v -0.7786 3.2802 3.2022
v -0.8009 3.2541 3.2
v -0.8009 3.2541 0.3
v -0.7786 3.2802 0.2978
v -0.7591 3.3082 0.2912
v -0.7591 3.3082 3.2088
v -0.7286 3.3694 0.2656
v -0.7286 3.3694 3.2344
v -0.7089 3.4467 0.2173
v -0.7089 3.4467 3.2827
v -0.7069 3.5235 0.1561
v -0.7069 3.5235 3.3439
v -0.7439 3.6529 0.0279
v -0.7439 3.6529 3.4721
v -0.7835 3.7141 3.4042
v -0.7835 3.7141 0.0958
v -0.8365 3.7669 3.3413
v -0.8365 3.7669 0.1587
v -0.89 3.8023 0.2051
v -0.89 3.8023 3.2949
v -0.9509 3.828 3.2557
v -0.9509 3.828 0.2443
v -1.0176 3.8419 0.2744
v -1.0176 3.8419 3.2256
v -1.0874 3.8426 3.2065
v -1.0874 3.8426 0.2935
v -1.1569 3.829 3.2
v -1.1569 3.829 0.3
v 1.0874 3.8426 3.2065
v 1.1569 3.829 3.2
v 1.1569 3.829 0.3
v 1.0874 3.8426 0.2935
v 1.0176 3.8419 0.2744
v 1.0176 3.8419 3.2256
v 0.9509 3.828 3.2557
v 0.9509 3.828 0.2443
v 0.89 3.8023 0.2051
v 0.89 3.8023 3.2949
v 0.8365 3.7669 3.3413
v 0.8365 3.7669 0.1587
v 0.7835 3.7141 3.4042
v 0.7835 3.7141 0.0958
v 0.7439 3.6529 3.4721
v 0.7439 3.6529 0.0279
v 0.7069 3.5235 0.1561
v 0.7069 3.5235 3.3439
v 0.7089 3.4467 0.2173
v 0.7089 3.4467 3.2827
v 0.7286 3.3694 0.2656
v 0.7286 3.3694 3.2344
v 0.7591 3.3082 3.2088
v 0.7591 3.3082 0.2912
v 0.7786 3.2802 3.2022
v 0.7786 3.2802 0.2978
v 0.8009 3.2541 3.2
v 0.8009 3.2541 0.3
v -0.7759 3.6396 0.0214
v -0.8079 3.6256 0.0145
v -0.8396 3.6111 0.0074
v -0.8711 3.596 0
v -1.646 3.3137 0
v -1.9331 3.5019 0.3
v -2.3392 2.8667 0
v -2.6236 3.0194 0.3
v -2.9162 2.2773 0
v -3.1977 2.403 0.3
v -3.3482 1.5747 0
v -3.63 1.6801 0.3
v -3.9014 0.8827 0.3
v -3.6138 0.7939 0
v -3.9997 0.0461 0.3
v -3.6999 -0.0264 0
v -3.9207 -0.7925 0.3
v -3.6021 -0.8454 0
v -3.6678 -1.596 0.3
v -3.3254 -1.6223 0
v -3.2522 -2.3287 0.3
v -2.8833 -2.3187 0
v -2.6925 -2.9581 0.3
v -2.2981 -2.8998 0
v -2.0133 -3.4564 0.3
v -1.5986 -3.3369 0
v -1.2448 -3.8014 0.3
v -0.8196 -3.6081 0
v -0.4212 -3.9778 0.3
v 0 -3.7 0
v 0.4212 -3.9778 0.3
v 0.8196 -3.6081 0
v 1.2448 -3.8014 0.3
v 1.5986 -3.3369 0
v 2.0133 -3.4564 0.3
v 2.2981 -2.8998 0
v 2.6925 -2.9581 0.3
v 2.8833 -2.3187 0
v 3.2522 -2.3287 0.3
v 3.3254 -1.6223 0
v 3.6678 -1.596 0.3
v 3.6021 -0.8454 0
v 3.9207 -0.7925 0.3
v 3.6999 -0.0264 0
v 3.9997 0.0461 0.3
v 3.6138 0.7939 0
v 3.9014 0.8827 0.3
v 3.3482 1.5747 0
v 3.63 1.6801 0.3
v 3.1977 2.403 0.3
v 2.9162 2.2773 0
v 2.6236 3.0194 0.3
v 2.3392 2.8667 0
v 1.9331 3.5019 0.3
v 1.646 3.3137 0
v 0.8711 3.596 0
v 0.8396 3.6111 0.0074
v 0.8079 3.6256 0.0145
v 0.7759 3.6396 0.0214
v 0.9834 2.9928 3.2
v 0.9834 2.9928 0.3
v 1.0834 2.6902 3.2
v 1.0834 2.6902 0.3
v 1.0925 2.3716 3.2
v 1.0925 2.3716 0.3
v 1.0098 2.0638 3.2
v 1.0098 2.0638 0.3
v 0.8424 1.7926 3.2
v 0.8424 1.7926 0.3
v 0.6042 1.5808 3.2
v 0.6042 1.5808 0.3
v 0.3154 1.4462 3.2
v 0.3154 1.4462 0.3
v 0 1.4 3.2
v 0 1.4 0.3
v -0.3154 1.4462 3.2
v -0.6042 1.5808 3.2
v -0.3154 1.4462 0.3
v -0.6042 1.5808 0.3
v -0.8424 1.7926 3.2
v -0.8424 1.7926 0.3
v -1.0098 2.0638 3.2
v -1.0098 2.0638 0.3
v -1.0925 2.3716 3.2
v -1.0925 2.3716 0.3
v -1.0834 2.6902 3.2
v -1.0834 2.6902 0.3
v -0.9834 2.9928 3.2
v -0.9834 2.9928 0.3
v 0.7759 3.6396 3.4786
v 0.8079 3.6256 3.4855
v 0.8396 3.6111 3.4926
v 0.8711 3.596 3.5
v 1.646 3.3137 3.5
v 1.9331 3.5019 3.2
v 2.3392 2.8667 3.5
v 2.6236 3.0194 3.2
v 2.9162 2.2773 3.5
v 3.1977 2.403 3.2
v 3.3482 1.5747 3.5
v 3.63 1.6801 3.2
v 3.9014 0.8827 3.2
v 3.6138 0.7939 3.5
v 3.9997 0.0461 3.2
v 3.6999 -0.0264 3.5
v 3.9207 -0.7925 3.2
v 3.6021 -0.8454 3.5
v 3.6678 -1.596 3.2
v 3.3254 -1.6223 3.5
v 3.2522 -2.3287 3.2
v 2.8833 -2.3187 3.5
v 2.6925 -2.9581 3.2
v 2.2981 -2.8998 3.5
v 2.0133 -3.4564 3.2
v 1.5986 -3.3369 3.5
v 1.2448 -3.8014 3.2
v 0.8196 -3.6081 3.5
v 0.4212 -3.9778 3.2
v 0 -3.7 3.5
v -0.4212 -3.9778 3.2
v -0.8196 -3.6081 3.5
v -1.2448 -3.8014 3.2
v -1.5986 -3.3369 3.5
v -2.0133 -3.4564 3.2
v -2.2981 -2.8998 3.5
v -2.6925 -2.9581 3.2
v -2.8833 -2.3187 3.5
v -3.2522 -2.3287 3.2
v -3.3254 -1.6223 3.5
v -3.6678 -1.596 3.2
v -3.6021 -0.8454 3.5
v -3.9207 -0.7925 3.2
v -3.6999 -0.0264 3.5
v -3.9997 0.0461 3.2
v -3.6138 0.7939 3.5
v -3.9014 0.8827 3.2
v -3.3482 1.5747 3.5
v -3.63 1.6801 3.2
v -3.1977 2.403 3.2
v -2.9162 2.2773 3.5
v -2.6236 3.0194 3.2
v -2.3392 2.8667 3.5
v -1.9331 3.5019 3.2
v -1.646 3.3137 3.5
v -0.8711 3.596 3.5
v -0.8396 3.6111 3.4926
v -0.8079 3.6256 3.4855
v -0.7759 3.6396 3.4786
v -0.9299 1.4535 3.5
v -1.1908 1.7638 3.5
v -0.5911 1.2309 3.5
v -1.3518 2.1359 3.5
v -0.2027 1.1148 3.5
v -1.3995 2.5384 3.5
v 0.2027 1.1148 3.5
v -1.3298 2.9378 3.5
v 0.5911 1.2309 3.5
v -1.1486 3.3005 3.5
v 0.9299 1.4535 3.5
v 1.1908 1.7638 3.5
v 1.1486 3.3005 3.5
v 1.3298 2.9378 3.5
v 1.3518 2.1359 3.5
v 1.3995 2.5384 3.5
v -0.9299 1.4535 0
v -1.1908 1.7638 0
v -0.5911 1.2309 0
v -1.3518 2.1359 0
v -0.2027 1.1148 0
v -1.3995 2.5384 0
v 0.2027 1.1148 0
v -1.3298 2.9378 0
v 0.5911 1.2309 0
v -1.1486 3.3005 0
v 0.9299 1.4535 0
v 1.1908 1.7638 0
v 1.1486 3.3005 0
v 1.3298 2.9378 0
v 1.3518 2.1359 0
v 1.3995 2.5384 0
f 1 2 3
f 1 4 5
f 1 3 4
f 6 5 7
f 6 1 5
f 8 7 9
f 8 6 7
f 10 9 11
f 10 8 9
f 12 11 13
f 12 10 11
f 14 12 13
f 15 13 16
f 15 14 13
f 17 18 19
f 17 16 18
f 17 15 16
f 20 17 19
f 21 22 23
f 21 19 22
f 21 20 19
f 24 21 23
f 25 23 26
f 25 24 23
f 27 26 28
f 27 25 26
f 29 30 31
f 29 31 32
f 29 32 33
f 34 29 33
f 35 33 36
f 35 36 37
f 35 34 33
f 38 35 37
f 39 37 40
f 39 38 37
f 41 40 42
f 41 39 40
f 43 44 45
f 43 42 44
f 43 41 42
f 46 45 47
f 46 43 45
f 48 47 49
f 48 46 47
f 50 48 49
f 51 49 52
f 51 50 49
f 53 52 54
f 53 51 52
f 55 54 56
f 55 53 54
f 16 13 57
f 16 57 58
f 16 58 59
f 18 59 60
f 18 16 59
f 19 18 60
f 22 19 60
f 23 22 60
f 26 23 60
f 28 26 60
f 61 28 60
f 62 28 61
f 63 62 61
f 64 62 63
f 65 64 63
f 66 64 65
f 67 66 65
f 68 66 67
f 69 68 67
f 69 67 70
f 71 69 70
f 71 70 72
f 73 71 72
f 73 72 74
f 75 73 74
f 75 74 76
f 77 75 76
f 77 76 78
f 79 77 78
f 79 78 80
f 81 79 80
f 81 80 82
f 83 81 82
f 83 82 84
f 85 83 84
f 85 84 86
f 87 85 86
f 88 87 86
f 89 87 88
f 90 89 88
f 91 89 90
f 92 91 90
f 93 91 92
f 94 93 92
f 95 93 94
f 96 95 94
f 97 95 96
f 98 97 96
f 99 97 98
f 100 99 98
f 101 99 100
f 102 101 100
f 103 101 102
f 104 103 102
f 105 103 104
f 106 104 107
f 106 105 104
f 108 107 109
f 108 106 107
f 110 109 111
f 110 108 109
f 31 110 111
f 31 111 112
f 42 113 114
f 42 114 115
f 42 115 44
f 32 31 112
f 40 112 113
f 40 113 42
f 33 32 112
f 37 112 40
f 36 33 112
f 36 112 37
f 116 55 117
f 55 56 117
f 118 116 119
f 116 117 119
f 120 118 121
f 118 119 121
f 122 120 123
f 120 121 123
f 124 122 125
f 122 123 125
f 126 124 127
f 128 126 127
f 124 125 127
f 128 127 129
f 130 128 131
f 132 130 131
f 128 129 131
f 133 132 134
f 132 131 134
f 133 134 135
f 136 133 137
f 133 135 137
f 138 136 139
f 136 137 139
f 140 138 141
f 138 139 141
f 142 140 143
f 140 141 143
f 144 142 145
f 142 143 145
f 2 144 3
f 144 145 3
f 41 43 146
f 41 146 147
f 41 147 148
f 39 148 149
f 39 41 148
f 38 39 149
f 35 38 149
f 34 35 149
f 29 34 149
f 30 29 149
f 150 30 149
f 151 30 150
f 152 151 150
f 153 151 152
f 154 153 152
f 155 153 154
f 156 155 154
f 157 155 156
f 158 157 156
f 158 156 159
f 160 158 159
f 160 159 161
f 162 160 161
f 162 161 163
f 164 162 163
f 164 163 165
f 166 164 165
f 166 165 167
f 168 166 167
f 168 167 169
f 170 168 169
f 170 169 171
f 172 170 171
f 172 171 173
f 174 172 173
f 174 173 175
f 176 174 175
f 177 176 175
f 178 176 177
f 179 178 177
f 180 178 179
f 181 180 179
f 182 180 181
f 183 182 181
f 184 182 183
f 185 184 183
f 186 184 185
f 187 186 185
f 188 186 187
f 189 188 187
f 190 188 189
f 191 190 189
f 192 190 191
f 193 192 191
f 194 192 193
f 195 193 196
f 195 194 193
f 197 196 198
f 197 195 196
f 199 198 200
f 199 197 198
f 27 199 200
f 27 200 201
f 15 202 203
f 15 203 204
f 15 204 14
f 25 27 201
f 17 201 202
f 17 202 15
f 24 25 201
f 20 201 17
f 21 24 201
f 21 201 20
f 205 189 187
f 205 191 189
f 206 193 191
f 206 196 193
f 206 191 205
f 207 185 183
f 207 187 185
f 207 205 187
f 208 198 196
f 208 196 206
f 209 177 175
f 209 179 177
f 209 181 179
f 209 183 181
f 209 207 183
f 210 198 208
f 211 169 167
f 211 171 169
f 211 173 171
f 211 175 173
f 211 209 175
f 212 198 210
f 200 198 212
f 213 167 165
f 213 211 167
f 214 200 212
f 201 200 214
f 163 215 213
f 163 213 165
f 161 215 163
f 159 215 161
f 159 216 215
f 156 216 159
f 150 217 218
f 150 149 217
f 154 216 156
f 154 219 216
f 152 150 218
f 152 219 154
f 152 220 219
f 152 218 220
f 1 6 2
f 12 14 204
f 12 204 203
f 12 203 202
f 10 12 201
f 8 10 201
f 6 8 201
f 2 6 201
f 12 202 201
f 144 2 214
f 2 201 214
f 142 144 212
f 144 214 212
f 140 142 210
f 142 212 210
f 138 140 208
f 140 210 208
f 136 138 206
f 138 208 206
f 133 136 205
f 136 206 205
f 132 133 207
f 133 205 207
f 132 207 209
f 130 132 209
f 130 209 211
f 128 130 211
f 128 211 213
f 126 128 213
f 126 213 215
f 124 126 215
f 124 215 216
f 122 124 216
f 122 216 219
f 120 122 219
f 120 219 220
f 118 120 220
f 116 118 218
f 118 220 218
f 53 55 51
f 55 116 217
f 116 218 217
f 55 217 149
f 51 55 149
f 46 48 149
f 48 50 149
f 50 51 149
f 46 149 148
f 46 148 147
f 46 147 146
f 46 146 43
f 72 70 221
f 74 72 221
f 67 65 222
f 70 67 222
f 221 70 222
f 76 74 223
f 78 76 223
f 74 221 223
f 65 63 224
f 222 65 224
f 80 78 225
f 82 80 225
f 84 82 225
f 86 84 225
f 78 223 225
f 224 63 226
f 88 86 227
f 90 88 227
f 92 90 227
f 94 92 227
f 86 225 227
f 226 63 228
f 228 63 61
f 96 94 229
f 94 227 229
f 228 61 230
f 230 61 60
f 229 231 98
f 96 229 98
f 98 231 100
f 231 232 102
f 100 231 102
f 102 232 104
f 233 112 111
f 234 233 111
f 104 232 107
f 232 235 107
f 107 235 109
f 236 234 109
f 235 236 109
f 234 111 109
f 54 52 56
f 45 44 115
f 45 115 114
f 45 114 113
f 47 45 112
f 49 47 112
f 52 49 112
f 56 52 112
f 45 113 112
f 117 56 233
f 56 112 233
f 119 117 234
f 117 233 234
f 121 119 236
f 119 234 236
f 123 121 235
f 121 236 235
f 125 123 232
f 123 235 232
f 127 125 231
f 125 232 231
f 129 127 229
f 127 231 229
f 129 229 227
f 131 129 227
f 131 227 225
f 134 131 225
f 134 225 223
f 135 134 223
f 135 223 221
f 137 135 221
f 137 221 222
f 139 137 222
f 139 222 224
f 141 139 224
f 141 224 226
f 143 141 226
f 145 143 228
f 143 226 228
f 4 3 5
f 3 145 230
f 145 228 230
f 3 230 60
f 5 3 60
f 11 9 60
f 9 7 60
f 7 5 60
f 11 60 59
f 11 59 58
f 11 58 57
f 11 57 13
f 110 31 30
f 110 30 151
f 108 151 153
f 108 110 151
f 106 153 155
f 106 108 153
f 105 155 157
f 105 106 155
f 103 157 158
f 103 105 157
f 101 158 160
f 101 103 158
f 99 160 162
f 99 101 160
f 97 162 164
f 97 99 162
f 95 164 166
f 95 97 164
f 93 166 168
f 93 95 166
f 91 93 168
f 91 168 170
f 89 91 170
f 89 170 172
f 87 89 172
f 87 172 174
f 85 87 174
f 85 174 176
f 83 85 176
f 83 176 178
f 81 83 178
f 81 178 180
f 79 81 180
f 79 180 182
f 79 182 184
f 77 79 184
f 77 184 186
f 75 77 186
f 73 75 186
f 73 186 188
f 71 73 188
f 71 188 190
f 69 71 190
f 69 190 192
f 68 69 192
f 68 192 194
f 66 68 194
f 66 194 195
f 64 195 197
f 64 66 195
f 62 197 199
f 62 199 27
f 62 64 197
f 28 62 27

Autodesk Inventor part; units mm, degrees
ref_plane "YZ Plane" through (0, 0, 0) normal (1, 0, 0) x (0, 1, 0)
ref_plane "XZ Plane" through (0, 0, 0) normal (0, 1, 0) x (-1, 0, 0)
ref_plane "XY Plane" through (0, 0, 0) normal (0, 0, 1) x (1, 0, 0)
sketch "Sketch1" plane through (0, 0, 0) normal (0, 0, 1) x (1, 0, 0)
  circle A0 centre (0, 0) radius 4
  dimension "d0" = 8
extrude "Extrusion1" add sketch "Sketch1" along normal blind 3.5
sketch "Sketch4" plane through (0, 0, 0) normal (0, 0, -1) x (-1, 0, 0)
  line L0 (0, 0) -> (0, 2.5)
  circle A0 centre (0, 2.5) radius 1.1
  dimension "d9" = 2.5
  dimension "d10" = 2.2
extrude "Extrusion3" cut sketch "Sketch4" against normal through all
chamfer "Chamfer1" distance 0.3 angle 45 4 edges at (-4, 0, 3.5) (-4, 0, 0) (1.1, 2.5, 0) (1.1, 2.5, 3.5)
sketch "Sketch5" plane through (0, 0, 3.5) normal (0, 0, 1) x (1, 0, 0)
  line L0 (-0.4, 4.2659) -> (0.4, 4.2659)
  line L1 (0.4, 4.2659) -> (0.4, 2.9071)
  line L2 (0.4, 2.9071) -> (-0.4, 2.9071)
  line L3 (-0.4, 2.9071) -> (-0.4, 4.2659)
  circle A0 centre (0, 2.5) radius 1.1 construction
  point P0 (0, 0)
  dimension "d16" = 0.4
  dimension "d17" = 0.4
extrude "Extrusion4" cut sketch "Sketch5" against normal through all
fillet "Fillet1" radius 0.35 4 edges at (-0.4, 3.5247, 1.75) (-0.4, 3.9799, 1.75) (0.4, 3.5247, 1.75) (0.4, 3.9799, 1.75)
equation "\"d17\" = d16"
properties part number "CamShaft"
